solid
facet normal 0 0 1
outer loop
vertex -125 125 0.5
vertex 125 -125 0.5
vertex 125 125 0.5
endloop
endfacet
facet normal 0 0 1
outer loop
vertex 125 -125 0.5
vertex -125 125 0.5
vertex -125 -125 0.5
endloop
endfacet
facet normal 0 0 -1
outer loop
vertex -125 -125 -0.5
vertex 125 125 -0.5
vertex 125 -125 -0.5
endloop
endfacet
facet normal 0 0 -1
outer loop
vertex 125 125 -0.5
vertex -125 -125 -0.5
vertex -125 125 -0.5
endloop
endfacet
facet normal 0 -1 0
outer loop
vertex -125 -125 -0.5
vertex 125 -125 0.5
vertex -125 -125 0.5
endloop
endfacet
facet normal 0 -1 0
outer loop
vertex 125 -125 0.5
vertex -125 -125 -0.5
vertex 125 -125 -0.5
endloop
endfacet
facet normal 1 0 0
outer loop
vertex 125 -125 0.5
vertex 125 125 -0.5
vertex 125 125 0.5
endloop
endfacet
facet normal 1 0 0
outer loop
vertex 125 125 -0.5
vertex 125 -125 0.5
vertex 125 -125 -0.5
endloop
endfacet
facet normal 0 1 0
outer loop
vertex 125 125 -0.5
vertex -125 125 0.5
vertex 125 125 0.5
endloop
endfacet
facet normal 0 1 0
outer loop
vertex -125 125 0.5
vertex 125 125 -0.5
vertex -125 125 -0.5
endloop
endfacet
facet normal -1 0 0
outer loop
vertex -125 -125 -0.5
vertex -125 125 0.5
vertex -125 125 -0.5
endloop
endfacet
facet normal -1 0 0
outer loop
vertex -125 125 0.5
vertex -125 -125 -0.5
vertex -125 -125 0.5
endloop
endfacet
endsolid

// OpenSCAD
//intersection() {
   //surface(file = "example010.dat", center = true, convexity = 5);
   //rotate(45, [0, 0, 1]) surface(file = "example010.dat", center = true, convexity = 5); 
 //}

thick = 1;
imsize = 200;



//print();
//sheet(0);
//combine();
union() {
  cube(size=[imsize+50,imsize+50,thick],center=true); 
  translate([0, 0, 5]) scale([1, 1, 0.2]) surface(file = "200crop.png", center=true);
}

module sheet(off = 0) {
   cube(size=[imsize+50,imsize+50,thick],center=true);
         
}


module print() {
    scale([1, 1, 0.2]) surface(file = "200crop.png",center=true);
    
}
